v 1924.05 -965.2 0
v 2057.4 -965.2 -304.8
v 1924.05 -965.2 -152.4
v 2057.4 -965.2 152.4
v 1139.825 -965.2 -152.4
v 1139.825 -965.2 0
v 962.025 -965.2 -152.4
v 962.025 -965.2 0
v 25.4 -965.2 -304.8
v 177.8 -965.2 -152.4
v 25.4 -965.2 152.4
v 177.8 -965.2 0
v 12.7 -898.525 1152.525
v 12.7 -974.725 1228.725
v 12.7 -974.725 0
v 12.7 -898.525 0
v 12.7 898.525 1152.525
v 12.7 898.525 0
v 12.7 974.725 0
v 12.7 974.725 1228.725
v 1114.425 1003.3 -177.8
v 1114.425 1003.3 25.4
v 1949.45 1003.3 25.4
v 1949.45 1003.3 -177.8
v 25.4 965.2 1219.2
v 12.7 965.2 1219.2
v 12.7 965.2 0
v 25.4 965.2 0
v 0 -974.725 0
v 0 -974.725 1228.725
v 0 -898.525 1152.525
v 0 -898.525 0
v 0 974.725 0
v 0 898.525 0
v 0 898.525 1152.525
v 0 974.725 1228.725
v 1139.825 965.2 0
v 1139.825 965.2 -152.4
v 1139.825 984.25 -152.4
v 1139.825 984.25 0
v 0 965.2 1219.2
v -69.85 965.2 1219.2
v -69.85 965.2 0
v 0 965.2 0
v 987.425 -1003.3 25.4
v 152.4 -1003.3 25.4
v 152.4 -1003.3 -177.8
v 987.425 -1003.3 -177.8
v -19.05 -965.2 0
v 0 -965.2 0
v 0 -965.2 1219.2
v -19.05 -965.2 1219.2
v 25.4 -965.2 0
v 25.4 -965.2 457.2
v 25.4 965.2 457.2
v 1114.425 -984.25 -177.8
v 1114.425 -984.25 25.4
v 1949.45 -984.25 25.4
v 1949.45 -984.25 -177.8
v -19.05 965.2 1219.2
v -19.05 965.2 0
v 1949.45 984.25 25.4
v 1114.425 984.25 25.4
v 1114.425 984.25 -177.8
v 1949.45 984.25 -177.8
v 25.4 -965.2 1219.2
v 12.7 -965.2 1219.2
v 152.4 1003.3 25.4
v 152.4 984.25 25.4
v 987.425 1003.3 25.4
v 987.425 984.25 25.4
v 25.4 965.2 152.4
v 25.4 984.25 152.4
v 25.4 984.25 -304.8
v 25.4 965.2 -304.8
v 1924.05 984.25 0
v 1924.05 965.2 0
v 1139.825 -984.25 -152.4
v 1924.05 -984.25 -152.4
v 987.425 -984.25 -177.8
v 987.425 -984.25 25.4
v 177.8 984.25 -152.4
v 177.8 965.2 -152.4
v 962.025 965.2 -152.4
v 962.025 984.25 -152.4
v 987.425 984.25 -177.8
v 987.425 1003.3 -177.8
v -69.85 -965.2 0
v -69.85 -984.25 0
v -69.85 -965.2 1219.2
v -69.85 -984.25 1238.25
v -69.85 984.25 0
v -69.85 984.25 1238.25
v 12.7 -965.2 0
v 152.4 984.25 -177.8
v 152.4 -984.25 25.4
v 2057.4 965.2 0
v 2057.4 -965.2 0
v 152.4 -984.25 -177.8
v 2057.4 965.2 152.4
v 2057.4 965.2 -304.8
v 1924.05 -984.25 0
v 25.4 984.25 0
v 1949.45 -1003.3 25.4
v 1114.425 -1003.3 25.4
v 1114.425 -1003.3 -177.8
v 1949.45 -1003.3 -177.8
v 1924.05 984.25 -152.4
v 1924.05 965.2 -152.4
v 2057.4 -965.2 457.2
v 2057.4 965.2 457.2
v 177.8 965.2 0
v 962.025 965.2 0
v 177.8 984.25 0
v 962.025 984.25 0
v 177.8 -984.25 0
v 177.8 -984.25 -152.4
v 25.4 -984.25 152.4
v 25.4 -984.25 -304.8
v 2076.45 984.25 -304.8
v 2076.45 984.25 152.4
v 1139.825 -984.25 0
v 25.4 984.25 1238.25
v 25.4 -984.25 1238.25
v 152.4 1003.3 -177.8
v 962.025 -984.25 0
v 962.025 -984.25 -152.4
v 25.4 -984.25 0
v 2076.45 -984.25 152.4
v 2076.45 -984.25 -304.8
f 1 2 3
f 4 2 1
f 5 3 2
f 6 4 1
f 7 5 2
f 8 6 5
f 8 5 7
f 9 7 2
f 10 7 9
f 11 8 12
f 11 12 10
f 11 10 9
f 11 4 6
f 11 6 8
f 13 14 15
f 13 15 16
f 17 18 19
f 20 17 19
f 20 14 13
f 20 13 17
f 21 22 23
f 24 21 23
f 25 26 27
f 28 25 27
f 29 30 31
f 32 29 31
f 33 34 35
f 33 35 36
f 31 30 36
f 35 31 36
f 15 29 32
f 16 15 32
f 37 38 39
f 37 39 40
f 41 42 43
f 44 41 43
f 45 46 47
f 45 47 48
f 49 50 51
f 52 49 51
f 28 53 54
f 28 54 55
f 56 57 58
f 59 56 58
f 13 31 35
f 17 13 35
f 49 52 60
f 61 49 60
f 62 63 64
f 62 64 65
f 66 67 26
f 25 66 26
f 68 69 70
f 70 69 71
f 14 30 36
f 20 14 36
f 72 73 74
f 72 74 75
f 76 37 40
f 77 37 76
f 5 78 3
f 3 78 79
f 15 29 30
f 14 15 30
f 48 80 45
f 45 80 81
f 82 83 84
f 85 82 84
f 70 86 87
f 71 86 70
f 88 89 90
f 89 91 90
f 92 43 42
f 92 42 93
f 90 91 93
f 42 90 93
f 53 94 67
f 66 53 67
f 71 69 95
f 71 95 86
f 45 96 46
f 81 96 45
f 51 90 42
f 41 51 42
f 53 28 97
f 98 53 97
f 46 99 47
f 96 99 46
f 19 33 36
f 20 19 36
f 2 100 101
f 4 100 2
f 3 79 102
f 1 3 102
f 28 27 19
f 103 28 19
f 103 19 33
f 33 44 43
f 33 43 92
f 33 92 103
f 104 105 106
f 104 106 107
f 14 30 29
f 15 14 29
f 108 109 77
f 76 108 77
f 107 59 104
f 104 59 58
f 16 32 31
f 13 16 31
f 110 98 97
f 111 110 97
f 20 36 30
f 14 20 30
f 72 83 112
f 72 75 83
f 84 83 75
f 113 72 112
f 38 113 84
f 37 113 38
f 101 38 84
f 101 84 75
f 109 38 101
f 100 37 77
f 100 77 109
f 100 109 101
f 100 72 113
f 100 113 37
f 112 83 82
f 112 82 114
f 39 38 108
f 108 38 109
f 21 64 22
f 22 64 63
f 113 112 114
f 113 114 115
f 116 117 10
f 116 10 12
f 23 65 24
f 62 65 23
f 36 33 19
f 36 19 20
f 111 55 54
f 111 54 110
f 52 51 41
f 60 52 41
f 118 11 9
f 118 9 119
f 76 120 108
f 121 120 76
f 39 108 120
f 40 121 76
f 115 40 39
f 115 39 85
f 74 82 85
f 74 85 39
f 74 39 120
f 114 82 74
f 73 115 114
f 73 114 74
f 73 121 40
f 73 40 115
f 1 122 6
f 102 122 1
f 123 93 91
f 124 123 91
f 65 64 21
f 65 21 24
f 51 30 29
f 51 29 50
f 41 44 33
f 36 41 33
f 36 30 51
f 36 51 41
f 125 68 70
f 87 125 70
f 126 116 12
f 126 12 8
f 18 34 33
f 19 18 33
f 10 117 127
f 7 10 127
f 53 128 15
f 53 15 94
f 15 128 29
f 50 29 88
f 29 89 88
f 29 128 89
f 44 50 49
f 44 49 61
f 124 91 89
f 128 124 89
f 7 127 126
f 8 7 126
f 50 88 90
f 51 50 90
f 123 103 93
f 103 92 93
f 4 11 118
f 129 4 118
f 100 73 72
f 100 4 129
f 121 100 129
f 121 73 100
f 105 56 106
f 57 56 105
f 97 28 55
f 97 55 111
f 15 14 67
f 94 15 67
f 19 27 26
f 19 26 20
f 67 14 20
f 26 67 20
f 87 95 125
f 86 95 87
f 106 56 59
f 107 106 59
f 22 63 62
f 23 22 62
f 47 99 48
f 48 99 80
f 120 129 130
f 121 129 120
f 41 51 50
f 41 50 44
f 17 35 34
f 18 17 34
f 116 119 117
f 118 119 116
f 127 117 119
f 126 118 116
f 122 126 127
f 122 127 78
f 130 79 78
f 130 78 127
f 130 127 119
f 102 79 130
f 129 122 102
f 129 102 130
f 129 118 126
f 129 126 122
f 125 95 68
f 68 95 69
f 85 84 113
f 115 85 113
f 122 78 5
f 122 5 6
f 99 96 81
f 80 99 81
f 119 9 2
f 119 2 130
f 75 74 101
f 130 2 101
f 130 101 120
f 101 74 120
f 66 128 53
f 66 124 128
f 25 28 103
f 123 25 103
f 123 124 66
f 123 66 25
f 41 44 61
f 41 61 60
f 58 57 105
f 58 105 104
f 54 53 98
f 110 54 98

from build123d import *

# Parameters (mm, degrees)
F0_W          = 1930.4
F0_H          = 1219.2
F1_DEPTH      = 19.05
F4_DEPTH      = 82.55
F4_DEPTH_BACK = 12.7
F5_W          = 1949.45
F5_H          = 1228.725
F6_DEPTH      = 12.7
F8_DEPTH      = 12.7
F9_W          = 2032
F9_H          = 1930.4
F10_DEPTH     = 457.2
F13_DEPTH     = 457.2
F14_W         = 784.225
F14_H         = 152.4
F15_DEPTH     = 2540
F16_W         = 835.025
F16_H         = 203.2
F17_DEPTH     = 19.05


with BuildPart() as f1:
    # F0 (on Right) → F1 (new body)
    with BuildSketch(Plane.YZ):
        with Locations((0, 609.6)):
            Rectangle(F0_W, F0_H)
    extrude(amount=-F1_DEPTH)


with BuildPart() as f4:
    # F3 (on offset) → F4 (new body, two sides)
    with BuildSketch(Plane.YZ.offset(12.7)) as f4_sk:
        Polygon((-984.25, 0), (-965.2, 0), (-965.2, 1219.2), (-984.25, 1238.25), align=None)
        Polygon((-984.25, 1238.25), (-965.2, 1219.2), (965.2, 1219.2), (984.25, 1238.25), align=None)
        Polygon((984.25, 1238.25), (965.2, 1219.2), (965.2, 0), (984.25, 0), align=None)
    extrude(amount=-F4_DEPTH)
    extrude(f4_sk.sketch, amount=F4_DEPTH_BACK)

    # F5 (on face) → F6 (cut)
    with BuildSketch(Plane.YZ):
        with Locations((0, 614.3625)):
            Rectangle(F5_W, F5_H)
    extrude(amount=F6_DEPTH, mode=Mode.SUBTRACT)


with BuildPart() as f8:
    # F7 (on face) → F8 (new body)
    with BuildSketch(Plane.YZ):
        Polygon((-974.725, 1228.725), (-974.725, 0), (-898.525, 0), (-898.525, 1152.525), (898.525, 1152.525), (898.525, 0), (974.725, 0), (974.725, 1228.725), align=None)
    extrude(amount=F8_DEPTH)


with BuildPart() as f10:
    # F9 (on Top) → F10 (new body)
    with BuildSketch(Plane.XY):
        with Locations((1041.4, 0)):
            Rectangle(F9_W, F9_H)
    extrude(amount=F10_DEPTH)


with BuildPart() as f13:
    # F12 (on offset) → F13 (new body)
    with BuildSketch(Plane.XY.offset(152.4)):
        Polygon((25.4, -965.2), (25.4, -984.25), (2076.45, -984.25), (2076.45, 984.25), (25.4, 984.25), (25.4, 965.2), (2057.4, 965.2), (2057.4, -965.2), align=None)
    extrude(amount=-F13_DEPTH)

    # F14 (on face) → F15 (cut)
    with BuildSketch(Plane.XZ.offset(984.25)):
        with Locations((569.9125, -76.2)):
            Rectangle(F14_W, F14_H)
        with Locations((1531.9375, -76.2)):
            Rectangle(F14_W, F14_H)
    extrude(amount=-F15_DEPTH, mode=Mode.SUBTRACT)


with BuildPart() as f17:
    # F16 (on face) → F17 (new body)
    with BuildSketch(Plane.XZ.offset(984.25)):
        with Locations((569.9125, -76.2)):
            Rectangle(F16_W, F16_H)
    extrude(amount=F17_DEPTH)


with BuildPart() as f17b:
    # F16 (on face) → F17, piece 2 (new body)
    with BuildSketch(Plane.XZ.offset(984.25)):
        with Locations((1531.9375, -76.2)):
            Rectangle(F16_W, F16_H)
    extrude(amount=F17_DEPTH)


with BuildPart() as f18_1:
    # F18: instance of F17
    add(f17.part.mirror(Plane.XZ))


with BuildPart() as f18_2:
    # F18: instance of F17b
    add(f17b.part.mirror(Plane.XZ))


solid = Compound([f1.part, f4.part, f8.part, f10.part, f13.part, f17.part, f17b.part, f18_1.part, f18_2.part])
